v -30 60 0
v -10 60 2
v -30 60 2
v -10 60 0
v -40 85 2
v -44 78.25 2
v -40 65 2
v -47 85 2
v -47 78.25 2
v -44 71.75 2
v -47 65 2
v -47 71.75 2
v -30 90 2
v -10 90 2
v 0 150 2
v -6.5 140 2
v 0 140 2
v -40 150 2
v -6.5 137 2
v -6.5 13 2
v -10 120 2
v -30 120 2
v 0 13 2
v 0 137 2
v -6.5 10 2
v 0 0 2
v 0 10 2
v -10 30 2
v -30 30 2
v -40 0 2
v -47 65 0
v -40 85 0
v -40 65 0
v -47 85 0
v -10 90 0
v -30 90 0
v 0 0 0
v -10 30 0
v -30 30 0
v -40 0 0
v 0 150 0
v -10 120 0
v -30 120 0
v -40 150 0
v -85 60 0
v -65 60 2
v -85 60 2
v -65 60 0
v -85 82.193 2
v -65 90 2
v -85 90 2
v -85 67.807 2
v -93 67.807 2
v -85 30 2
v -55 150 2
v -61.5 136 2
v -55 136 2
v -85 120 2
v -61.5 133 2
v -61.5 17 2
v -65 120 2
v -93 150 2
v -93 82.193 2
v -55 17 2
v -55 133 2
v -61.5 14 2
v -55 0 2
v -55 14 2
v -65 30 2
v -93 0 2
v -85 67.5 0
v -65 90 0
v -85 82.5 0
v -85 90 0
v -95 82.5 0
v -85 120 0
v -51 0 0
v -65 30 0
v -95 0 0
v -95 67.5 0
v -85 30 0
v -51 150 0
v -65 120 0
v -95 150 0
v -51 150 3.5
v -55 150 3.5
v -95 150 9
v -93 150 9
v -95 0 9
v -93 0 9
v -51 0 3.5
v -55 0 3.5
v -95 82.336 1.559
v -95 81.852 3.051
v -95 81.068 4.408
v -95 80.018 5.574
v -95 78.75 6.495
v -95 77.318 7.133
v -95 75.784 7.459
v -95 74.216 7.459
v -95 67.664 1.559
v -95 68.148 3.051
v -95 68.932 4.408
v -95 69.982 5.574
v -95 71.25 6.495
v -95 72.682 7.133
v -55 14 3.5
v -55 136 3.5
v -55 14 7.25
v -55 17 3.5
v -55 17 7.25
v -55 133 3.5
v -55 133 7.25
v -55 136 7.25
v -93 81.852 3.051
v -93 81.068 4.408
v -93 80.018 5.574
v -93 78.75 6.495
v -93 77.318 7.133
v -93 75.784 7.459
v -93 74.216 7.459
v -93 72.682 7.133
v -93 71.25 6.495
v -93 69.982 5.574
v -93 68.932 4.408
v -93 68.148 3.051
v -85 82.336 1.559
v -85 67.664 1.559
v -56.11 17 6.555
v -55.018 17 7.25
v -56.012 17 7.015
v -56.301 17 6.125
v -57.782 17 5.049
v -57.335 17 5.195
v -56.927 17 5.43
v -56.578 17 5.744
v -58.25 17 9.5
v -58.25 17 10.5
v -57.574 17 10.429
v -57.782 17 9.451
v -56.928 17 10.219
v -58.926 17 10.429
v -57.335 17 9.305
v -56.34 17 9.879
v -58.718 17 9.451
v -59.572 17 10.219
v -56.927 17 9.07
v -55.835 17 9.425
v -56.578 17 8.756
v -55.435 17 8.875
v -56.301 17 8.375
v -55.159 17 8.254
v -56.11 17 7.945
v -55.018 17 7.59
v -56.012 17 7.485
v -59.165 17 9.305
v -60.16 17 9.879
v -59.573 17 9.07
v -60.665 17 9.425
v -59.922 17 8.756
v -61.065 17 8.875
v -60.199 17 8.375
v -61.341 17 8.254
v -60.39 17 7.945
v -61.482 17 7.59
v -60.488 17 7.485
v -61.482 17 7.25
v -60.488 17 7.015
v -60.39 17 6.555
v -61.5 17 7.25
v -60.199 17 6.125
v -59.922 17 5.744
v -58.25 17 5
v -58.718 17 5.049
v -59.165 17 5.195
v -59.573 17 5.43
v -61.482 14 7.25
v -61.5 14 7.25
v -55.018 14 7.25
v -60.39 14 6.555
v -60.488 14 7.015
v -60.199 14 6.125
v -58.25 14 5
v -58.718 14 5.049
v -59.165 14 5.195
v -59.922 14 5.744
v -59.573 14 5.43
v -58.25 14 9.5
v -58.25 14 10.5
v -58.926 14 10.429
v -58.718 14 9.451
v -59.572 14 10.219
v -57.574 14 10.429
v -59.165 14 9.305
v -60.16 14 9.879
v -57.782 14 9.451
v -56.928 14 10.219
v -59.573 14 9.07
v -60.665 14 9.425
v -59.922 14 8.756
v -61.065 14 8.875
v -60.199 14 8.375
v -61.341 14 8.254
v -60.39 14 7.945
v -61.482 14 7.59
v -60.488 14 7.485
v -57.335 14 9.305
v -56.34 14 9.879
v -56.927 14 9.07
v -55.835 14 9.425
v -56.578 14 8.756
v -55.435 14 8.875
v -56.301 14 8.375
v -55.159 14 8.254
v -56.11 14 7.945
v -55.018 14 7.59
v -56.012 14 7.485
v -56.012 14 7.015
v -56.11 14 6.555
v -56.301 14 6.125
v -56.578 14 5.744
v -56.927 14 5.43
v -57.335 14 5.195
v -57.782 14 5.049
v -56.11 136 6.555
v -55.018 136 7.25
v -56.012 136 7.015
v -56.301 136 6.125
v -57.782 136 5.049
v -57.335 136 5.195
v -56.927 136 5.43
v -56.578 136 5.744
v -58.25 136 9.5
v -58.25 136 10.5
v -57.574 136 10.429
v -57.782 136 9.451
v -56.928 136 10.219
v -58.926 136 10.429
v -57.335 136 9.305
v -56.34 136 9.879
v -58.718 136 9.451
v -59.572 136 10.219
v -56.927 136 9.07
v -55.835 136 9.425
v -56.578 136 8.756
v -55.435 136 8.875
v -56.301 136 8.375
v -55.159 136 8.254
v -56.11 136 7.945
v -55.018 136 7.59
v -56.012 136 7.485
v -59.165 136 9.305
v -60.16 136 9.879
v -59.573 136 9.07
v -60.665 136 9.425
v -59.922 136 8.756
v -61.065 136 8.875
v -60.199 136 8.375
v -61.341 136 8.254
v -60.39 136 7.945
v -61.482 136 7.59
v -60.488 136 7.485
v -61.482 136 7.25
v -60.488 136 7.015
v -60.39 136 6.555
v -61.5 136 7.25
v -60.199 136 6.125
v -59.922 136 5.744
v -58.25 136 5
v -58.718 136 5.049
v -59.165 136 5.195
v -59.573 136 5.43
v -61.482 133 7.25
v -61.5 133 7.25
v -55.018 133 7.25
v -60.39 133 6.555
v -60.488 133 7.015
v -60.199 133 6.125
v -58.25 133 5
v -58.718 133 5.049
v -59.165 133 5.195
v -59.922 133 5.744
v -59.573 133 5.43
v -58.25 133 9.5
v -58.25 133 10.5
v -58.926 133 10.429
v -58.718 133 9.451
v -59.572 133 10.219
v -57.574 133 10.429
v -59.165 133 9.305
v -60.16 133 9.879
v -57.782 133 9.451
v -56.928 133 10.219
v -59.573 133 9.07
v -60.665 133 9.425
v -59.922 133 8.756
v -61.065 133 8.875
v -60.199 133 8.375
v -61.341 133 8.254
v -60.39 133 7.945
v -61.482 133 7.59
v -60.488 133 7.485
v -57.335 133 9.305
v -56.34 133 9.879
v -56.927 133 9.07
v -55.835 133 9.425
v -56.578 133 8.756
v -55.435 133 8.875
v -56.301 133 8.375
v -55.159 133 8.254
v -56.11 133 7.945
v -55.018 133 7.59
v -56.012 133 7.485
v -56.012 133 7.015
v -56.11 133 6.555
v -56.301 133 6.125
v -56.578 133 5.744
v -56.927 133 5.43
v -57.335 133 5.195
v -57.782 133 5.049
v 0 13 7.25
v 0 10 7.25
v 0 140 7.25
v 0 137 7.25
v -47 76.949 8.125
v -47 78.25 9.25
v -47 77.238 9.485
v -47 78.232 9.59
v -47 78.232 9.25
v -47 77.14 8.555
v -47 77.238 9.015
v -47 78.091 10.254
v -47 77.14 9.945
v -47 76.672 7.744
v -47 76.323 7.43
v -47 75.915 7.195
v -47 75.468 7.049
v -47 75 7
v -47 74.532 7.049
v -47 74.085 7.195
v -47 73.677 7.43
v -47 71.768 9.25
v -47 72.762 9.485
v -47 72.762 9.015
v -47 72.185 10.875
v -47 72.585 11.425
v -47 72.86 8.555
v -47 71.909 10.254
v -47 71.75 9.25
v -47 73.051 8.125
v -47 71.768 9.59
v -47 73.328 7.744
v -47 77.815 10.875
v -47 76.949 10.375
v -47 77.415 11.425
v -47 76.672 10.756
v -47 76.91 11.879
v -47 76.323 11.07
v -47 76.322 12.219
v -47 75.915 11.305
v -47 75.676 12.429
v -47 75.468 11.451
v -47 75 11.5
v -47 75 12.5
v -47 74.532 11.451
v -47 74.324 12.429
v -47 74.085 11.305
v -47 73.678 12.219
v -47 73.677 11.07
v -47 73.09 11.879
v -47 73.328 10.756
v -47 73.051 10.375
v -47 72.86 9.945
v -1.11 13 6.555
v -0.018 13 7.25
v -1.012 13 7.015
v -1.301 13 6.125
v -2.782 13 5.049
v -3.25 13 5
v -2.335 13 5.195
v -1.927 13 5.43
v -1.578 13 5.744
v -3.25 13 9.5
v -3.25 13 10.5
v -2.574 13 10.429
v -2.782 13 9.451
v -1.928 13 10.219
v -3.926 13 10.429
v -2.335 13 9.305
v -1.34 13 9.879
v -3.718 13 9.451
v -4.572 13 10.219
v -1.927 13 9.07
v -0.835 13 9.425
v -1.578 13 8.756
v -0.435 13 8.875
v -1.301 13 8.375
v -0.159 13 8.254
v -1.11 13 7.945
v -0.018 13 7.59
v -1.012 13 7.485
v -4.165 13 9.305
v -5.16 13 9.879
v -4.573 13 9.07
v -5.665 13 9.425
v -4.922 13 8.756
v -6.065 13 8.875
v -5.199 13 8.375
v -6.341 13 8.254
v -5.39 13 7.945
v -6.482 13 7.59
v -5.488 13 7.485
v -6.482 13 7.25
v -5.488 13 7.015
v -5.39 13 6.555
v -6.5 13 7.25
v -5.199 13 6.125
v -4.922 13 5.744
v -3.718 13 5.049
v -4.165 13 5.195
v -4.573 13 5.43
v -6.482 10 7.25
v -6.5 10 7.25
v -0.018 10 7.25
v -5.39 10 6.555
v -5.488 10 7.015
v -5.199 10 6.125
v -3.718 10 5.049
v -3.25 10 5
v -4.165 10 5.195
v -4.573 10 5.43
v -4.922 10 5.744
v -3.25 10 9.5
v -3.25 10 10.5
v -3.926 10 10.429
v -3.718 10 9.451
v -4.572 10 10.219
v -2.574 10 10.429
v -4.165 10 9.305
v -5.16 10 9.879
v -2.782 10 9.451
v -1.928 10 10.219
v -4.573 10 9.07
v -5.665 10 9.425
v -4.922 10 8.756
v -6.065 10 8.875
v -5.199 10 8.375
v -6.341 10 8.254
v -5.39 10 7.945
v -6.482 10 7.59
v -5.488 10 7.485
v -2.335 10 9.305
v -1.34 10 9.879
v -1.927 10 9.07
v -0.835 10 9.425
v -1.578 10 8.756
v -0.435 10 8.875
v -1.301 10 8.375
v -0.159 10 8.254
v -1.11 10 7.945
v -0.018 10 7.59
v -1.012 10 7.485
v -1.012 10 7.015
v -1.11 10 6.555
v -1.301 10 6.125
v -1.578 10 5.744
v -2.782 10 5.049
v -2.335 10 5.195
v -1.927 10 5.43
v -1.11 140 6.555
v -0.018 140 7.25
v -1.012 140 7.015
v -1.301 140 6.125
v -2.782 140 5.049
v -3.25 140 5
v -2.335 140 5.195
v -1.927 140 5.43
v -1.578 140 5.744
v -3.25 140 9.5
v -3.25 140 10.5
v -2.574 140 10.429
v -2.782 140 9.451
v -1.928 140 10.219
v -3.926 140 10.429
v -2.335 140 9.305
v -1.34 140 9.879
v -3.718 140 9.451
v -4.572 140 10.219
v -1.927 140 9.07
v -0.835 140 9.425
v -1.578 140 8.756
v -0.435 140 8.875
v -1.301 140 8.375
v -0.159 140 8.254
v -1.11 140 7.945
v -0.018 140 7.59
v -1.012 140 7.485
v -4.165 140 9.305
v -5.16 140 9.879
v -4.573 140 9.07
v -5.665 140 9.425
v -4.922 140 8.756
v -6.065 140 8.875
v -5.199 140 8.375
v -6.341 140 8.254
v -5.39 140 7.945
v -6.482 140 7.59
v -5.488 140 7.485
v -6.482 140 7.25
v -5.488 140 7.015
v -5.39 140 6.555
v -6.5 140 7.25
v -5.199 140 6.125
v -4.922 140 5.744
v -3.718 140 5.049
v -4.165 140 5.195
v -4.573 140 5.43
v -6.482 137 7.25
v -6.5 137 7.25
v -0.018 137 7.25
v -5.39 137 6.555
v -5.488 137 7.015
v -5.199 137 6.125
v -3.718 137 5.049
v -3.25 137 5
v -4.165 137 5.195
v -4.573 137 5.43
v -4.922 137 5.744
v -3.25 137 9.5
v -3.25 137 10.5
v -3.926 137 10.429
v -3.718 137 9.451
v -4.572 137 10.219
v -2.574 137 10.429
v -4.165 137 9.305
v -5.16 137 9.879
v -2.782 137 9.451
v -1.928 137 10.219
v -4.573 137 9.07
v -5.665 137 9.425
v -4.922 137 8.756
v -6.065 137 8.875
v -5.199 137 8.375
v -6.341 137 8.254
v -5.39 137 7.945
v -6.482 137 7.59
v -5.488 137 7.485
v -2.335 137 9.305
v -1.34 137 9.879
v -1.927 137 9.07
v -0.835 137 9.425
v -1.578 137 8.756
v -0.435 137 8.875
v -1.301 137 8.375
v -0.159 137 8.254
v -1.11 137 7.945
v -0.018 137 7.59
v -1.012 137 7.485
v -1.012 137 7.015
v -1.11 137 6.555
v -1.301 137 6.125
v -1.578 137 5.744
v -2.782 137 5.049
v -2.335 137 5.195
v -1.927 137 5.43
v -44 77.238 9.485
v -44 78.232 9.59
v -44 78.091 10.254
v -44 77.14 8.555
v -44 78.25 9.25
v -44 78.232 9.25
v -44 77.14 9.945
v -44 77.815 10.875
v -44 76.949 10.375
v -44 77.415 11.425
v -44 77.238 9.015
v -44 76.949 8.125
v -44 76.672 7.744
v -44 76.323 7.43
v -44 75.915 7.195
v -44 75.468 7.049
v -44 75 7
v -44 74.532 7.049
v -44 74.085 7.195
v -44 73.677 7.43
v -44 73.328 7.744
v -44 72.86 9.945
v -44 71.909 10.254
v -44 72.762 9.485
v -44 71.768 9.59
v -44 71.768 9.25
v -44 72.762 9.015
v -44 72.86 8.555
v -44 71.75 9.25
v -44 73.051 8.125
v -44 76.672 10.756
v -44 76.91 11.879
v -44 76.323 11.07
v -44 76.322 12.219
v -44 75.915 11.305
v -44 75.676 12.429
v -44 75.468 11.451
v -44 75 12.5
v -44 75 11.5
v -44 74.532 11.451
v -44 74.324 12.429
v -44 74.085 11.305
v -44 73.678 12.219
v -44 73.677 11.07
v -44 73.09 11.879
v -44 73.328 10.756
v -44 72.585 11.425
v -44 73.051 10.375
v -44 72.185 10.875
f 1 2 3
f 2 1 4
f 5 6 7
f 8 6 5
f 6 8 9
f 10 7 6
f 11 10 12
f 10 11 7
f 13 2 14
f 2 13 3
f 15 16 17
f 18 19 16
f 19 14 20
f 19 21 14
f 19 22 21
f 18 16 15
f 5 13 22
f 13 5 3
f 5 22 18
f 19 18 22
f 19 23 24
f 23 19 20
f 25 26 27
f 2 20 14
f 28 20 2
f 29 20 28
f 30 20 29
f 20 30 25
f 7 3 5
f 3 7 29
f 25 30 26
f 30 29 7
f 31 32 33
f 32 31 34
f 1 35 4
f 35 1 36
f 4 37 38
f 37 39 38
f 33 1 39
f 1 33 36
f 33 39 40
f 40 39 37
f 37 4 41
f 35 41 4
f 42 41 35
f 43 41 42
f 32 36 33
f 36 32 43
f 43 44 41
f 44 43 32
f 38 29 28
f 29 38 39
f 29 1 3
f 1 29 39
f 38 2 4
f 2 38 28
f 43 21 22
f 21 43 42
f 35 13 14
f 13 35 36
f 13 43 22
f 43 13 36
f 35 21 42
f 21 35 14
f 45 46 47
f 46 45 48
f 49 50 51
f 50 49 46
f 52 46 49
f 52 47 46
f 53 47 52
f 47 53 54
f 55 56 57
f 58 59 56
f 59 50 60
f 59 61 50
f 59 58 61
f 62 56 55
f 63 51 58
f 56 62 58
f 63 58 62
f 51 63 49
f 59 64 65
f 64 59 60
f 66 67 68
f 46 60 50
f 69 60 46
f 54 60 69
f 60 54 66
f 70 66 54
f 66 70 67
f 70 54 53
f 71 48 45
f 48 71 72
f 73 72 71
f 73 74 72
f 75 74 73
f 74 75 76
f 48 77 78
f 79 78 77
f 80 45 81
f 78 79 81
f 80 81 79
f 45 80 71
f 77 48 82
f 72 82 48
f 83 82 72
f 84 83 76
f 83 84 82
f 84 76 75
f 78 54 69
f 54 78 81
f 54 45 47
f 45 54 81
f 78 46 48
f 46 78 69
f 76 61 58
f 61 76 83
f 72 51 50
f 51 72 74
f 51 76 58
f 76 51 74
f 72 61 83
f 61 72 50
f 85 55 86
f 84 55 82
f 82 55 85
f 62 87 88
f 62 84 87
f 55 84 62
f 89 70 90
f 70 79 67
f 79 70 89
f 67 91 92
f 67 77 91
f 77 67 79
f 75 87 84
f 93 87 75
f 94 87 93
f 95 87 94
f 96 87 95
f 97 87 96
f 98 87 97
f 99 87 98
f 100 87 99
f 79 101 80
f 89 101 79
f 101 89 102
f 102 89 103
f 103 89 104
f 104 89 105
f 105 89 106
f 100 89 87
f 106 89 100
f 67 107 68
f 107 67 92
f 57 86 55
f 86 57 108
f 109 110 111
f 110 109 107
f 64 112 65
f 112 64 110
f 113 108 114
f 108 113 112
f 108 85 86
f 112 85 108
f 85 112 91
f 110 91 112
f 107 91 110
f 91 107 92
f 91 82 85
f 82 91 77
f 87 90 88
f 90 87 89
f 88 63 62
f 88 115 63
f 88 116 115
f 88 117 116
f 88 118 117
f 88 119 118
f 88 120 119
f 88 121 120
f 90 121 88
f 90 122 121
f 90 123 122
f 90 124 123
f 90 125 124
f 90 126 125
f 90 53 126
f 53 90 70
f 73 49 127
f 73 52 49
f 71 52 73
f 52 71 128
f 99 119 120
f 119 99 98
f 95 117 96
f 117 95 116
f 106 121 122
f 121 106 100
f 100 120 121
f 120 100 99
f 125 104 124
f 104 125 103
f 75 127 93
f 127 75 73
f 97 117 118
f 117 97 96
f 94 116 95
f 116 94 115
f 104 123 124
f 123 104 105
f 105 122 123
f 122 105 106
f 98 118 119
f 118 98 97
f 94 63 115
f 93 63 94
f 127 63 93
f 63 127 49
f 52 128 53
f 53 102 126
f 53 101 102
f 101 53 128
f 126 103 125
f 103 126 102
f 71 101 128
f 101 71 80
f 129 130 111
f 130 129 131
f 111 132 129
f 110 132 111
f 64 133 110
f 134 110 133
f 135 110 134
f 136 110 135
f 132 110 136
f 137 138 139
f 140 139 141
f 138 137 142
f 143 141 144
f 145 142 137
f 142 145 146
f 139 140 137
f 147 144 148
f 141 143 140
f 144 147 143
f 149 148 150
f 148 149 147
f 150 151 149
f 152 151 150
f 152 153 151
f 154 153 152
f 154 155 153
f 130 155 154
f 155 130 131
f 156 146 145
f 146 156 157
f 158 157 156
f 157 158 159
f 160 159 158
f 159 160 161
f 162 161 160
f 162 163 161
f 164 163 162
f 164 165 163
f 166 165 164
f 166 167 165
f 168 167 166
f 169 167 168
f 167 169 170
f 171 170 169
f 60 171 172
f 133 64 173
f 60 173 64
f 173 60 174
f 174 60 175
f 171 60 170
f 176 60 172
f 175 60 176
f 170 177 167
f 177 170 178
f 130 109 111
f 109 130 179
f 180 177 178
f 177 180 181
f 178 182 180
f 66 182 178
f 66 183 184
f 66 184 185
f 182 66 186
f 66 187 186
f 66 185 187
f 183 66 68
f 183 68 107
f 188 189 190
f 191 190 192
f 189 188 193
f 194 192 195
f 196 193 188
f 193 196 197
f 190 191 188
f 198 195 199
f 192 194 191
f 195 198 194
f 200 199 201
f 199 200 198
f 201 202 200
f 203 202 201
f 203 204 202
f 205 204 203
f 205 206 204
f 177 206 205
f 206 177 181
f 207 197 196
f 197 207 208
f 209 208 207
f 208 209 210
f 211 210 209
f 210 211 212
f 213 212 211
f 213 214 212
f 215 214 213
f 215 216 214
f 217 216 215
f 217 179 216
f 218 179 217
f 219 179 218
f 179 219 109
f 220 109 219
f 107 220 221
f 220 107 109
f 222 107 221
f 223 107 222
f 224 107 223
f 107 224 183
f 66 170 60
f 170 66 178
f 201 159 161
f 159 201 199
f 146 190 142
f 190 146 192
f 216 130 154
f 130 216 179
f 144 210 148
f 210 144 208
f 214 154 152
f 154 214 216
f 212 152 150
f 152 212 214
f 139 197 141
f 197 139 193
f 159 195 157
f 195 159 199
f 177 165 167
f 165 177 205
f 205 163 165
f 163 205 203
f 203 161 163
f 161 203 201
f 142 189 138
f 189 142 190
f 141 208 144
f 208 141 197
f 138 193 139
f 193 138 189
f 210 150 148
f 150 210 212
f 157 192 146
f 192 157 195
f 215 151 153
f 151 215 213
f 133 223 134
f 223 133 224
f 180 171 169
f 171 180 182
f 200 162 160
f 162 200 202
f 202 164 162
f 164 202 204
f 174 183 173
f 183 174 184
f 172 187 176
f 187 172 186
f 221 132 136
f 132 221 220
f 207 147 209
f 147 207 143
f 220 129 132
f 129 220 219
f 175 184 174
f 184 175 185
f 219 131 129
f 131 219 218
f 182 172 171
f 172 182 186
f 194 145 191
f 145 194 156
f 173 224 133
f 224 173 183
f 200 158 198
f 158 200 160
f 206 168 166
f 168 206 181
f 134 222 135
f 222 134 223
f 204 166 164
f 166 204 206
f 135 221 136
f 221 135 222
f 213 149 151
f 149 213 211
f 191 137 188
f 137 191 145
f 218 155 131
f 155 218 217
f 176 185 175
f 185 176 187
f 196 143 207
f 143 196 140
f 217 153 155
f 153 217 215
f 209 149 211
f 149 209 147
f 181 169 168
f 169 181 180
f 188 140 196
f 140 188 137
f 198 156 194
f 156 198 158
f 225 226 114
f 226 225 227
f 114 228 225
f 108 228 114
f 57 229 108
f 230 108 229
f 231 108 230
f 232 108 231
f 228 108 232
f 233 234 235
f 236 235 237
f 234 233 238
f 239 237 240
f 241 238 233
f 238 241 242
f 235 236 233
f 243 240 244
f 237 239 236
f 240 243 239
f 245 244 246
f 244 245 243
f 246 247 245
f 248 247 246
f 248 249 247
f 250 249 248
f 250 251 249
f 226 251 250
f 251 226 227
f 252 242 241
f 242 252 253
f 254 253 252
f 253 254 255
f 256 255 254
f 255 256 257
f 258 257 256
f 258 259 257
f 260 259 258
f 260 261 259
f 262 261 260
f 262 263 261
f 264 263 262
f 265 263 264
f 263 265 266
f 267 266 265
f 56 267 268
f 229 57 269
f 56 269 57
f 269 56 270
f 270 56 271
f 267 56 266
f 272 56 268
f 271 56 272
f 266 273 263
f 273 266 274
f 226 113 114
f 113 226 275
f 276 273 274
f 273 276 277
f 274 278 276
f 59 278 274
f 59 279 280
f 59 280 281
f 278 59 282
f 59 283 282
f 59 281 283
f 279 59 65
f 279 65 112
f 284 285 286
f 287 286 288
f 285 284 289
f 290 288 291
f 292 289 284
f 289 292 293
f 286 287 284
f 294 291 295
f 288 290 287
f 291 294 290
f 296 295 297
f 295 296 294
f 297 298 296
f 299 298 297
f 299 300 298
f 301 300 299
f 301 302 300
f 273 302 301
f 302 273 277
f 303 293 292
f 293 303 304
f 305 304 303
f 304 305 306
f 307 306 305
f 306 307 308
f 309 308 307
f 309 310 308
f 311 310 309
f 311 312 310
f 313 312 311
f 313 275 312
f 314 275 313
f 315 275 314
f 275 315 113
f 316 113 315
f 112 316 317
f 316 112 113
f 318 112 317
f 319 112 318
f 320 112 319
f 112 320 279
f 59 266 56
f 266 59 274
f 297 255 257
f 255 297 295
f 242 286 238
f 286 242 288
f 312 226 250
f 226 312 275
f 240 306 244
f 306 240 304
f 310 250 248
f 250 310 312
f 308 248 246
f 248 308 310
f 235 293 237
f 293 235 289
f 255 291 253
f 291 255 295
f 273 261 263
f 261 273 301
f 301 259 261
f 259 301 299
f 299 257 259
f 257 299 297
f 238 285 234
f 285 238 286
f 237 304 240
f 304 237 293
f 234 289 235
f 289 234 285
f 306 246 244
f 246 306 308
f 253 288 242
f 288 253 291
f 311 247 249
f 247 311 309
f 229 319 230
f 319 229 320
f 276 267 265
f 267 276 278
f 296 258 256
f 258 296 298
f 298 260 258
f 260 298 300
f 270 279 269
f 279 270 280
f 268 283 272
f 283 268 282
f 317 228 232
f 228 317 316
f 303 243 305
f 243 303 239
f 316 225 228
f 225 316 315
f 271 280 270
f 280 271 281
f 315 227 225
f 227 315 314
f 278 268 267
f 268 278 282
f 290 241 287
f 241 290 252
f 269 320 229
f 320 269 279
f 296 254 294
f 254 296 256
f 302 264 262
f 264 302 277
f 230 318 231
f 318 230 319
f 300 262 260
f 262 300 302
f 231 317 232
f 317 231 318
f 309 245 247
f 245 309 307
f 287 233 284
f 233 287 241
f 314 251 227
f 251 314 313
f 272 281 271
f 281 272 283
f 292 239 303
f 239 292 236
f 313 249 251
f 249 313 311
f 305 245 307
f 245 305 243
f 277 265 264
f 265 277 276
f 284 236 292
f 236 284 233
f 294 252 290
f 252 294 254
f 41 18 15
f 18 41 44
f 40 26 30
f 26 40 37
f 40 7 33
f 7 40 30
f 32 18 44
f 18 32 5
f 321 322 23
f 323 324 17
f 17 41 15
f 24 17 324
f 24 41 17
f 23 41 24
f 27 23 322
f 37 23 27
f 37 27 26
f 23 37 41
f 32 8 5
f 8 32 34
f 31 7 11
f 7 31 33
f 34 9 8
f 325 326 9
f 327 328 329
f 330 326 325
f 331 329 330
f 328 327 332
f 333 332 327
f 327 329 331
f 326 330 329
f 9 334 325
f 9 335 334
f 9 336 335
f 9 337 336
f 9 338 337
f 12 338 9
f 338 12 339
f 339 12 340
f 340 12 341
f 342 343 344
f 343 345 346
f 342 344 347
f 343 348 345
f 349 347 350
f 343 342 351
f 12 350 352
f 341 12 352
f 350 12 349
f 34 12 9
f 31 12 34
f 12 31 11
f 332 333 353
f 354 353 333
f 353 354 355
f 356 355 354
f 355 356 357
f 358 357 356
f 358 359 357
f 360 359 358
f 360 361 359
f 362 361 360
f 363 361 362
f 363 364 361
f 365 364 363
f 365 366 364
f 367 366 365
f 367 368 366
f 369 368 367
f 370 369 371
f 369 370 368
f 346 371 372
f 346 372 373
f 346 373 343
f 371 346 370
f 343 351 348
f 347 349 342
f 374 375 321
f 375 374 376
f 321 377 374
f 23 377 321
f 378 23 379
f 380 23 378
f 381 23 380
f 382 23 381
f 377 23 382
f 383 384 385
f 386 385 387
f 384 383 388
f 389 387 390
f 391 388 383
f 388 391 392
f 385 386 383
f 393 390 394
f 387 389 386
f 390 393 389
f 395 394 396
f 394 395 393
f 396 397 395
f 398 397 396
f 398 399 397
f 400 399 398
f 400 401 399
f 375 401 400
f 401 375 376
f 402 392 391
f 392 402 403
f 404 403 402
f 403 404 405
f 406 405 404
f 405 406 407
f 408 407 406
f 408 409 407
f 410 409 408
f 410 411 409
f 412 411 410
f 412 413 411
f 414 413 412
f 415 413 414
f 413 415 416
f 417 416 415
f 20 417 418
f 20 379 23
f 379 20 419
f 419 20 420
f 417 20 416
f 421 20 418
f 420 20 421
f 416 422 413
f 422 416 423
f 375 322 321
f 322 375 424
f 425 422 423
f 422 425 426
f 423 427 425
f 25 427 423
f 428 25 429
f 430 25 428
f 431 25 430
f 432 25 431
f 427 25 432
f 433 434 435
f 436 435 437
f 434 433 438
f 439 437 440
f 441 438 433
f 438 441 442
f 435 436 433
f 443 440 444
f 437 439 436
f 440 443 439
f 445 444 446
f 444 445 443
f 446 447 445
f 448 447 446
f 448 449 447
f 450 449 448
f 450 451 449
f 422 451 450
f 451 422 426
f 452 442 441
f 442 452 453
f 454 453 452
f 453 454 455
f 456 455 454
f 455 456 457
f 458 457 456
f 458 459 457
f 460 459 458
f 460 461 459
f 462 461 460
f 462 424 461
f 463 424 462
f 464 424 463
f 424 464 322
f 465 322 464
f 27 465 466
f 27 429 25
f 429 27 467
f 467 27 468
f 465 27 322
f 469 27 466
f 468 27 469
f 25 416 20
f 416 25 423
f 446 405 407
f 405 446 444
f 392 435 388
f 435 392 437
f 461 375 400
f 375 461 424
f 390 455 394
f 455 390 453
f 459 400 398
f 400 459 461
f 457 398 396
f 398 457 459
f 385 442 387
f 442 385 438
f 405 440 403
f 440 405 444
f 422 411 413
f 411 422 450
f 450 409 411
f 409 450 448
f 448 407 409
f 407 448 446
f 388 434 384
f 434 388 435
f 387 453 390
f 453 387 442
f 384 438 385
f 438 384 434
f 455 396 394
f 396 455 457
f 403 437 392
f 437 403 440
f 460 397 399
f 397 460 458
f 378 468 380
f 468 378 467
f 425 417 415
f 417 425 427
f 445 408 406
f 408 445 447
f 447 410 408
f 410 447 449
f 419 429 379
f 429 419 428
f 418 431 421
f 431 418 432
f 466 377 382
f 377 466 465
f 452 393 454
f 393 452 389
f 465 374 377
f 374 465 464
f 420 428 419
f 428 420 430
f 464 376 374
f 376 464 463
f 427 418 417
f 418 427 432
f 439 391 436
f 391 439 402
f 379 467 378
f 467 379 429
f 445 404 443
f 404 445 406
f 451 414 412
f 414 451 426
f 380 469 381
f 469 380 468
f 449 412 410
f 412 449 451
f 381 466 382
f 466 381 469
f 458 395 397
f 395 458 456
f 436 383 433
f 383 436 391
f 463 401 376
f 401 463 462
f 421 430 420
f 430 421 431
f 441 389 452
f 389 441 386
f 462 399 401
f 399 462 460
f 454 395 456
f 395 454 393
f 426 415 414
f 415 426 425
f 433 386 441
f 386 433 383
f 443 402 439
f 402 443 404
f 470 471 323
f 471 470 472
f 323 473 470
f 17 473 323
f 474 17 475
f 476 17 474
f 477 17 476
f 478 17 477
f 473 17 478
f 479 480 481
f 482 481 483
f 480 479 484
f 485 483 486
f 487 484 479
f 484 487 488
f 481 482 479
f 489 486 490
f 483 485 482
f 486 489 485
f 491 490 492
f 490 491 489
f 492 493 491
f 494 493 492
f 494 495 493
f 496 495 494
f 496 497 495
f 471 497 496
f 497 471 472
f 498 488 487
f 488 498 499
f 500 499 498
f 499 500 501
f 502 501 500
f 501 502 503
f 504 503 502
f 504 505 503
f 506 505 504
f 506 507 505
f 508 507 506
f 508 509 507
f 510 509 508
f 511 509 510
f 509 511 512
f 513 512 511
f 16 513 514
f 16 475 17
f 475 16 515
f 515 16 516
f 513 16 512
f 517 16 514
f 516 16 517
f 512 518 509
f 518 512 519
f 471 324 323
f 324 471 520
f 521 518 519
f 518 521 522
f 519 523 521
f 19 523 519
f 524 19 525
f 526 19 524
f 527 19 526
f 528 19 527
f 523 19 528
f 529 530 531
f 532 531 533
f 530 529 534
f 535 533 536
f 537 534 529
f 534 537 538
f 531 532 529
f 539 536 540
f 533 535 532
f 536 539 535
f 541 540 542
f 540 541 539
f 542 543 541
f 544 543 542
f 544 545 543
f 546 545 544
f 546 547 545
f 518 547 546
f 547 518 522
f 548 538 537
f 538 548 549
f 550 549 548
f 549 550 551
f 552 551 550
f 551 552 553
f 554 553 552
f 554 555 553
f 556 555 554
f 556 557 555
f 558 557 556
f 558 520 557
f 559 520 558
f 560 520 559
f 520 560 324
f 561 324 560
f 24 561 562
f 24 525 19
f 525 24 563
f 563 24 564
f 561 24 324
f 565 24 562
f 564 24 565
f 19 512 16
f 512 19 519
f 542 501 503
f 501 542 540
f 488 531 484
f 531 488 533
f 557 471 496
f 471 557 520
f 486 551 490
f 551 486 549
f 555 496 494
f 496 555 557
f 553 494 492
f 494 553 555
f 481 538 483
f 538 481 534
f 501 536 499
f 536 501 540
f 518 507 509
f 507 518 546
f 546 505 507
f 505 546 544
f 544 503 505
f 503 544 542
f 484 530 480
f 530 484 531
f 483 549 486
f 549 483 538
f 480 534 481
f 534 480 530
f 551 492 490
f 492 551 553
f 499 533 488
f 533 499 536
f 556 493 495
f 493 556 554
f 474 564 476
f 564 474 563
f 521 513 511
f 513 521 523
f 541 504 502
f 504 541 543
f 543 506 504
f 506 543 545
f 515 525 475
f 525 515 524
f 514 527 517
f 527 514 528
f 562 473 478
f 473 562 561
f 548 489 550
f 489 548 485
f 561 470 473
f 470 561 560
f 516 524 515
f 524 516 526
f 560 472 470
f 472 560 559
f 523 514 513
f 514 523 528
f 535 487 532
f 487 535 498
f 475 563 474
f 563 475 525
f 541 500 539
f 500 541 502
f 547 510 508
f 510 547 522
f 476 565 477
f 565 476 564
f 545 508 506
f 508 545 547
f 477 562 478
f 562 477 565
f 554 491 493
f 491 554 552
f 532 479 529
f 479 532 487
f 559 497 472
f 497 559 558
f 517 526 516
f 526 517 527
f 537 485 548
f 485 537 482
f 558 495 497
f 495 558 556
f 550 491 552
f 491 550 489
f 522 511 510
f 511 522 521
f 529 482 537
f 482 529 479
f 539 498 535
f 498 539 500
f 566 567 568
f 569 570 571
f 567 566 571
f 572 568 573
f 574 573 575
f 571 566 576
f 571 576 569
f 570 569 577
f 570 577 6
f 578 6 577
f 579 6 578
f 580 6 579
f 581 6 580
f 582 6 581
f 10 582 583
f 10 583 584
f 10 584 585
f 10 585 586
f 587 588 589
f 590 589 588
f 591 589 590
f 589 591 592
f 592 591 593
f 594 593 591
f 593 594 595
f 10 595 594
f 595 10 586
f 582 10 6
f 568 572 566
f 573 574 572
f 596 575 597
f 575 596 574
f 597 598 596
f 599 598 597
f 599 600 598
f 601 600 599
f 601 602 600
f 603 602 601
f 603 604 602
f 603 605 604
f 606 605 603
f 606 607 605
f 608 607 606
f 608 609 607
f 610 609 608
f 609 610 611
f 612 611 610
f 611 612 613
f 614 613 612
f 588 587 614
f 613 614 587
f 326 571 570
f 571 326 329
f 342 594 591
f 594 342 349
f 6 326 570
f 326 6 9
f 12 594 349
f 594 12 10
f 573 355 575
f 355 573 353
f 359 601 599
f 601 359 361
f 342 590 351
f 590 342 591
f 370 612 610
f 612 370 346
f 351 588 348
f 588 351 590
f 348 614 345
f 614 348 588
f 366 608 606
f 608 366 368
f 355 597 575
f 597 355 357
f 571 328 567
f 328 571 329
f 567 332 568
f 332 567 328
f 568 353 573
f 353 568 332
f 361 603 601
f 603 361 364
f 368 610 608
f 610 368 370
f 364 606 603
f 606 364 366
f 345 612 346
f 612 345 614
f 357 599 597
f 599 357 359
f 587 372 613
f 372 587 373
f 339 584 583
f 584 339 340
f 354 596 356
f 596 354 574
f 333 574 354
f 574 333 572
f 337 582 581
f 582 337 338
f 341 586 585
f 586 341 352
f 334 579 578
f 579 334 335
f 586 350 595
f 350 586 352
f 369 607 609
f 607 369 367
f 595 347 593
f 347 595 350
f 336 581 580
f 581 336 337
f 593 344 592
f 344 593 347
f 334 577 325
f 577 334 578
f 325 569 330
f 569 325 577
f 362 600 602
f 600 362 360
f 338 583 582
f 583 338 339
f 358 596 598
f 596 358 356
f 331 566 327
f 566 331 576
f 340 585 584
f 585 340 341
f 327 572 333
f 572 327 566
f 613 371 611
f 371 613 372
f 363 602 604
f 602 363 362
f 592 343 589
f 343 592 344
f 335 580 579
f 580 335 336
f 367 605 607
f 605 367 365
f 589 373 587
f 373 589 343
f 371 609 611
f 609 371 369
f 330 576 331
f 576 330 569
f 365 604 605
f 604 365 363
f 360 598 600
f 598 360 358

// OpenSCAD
// file: joint.scad
module joint(groundSpacing)
{
  hch = groundSpacing + 6.5/2;  // hole center height

  difference()
  {
    // main element
    union()
    {
      cube([3, 6.5, hch]);
      translate([0, 6.5/2, hch])
        rotate([0, 90, 0])
          cylinder(r=6.5/2, h=3, $fs=0.01);
    }
    // screw hole
    translate([-1, 6.5/2, hch])
      rotate([0, 90, 0])
        cylinder(r=4.5/2, h=3+2*1, $fs=0.01);
  }
}


joint(1);
// file: wallMount.scad
use <joint.scad>

module _wallSurface()
{
  difference()
  {
    union()
    {
      // root element
      cube([150, 40, 2]);
      // lock mount
      translate([(150-20)/2, 40, 0])
        cube([20, 7, 2]);
    }
    // holes
    for(offset = [30, 90])
      translate([offset, 10, 0])
        cube([30, 20, 2]);
  }
}


module _lock()
{
  translate([0, 3, 0])
    rotate([0, 0, -90])
      joint(4);
}


module wallMount()
{
  _wallSurface();
  for(offset = [10, 150-10-3])
    translate([offset, 0, 2])
      joint(2);
  translate([(150-20)/2 + 10-6.5/2, 40+7-3, 2])
    _lock();
}


wallMount();
// file: support.scad
use <joint.scad>

module _supportSurface()
{
  difference()
  {
    union()
    {
      difference()
      {
        // root element
        cube([150, 40, 2]);
        // holes
        for(offset = [30, 90])
          translate([offset, 10, 0])
            cube([30, 20, 2]);
      }
      // lower stripe for wall-support
      off = 4;
      translate([0, -off, 0])
        cube([150, off, 3.5]);
      // upport tablet block-wall
      translate([0, 40-2, 0])
        cube([150, 2, 9]);
    }
    // lock cut-in
    radius = 7.5;
    translate([150/2, 40-(10), 0])
      rotate([-90, 0, 0])
        cylinder(h=10, r=radius, $fs=0.01);
  }
}


module support()
{
  _supportSurface();
  for(offset = [10+(3+1), 150-10-3-(3+1)])
    translate([offset, 0, 2])
      joint(2);
}


support();
// main file
use <support.scad>
use <wallMount.scad>

module bothElements()
{
  translate([0, 55, 0])
    support();
  wallMount();
}


module closedPosition()
{
  wallMount();
  translate([150, 0, 14.5])
    rotate([0, 180, 0])
      support();
}

module openPosition()
{
  wallMount();
  translate([150, -4, 4])
    rotate([-90, 180, 0])
      support();
}


//%closedPosition();
//%openPosition();

rotate([0, 0, 90])
  bothElements();
